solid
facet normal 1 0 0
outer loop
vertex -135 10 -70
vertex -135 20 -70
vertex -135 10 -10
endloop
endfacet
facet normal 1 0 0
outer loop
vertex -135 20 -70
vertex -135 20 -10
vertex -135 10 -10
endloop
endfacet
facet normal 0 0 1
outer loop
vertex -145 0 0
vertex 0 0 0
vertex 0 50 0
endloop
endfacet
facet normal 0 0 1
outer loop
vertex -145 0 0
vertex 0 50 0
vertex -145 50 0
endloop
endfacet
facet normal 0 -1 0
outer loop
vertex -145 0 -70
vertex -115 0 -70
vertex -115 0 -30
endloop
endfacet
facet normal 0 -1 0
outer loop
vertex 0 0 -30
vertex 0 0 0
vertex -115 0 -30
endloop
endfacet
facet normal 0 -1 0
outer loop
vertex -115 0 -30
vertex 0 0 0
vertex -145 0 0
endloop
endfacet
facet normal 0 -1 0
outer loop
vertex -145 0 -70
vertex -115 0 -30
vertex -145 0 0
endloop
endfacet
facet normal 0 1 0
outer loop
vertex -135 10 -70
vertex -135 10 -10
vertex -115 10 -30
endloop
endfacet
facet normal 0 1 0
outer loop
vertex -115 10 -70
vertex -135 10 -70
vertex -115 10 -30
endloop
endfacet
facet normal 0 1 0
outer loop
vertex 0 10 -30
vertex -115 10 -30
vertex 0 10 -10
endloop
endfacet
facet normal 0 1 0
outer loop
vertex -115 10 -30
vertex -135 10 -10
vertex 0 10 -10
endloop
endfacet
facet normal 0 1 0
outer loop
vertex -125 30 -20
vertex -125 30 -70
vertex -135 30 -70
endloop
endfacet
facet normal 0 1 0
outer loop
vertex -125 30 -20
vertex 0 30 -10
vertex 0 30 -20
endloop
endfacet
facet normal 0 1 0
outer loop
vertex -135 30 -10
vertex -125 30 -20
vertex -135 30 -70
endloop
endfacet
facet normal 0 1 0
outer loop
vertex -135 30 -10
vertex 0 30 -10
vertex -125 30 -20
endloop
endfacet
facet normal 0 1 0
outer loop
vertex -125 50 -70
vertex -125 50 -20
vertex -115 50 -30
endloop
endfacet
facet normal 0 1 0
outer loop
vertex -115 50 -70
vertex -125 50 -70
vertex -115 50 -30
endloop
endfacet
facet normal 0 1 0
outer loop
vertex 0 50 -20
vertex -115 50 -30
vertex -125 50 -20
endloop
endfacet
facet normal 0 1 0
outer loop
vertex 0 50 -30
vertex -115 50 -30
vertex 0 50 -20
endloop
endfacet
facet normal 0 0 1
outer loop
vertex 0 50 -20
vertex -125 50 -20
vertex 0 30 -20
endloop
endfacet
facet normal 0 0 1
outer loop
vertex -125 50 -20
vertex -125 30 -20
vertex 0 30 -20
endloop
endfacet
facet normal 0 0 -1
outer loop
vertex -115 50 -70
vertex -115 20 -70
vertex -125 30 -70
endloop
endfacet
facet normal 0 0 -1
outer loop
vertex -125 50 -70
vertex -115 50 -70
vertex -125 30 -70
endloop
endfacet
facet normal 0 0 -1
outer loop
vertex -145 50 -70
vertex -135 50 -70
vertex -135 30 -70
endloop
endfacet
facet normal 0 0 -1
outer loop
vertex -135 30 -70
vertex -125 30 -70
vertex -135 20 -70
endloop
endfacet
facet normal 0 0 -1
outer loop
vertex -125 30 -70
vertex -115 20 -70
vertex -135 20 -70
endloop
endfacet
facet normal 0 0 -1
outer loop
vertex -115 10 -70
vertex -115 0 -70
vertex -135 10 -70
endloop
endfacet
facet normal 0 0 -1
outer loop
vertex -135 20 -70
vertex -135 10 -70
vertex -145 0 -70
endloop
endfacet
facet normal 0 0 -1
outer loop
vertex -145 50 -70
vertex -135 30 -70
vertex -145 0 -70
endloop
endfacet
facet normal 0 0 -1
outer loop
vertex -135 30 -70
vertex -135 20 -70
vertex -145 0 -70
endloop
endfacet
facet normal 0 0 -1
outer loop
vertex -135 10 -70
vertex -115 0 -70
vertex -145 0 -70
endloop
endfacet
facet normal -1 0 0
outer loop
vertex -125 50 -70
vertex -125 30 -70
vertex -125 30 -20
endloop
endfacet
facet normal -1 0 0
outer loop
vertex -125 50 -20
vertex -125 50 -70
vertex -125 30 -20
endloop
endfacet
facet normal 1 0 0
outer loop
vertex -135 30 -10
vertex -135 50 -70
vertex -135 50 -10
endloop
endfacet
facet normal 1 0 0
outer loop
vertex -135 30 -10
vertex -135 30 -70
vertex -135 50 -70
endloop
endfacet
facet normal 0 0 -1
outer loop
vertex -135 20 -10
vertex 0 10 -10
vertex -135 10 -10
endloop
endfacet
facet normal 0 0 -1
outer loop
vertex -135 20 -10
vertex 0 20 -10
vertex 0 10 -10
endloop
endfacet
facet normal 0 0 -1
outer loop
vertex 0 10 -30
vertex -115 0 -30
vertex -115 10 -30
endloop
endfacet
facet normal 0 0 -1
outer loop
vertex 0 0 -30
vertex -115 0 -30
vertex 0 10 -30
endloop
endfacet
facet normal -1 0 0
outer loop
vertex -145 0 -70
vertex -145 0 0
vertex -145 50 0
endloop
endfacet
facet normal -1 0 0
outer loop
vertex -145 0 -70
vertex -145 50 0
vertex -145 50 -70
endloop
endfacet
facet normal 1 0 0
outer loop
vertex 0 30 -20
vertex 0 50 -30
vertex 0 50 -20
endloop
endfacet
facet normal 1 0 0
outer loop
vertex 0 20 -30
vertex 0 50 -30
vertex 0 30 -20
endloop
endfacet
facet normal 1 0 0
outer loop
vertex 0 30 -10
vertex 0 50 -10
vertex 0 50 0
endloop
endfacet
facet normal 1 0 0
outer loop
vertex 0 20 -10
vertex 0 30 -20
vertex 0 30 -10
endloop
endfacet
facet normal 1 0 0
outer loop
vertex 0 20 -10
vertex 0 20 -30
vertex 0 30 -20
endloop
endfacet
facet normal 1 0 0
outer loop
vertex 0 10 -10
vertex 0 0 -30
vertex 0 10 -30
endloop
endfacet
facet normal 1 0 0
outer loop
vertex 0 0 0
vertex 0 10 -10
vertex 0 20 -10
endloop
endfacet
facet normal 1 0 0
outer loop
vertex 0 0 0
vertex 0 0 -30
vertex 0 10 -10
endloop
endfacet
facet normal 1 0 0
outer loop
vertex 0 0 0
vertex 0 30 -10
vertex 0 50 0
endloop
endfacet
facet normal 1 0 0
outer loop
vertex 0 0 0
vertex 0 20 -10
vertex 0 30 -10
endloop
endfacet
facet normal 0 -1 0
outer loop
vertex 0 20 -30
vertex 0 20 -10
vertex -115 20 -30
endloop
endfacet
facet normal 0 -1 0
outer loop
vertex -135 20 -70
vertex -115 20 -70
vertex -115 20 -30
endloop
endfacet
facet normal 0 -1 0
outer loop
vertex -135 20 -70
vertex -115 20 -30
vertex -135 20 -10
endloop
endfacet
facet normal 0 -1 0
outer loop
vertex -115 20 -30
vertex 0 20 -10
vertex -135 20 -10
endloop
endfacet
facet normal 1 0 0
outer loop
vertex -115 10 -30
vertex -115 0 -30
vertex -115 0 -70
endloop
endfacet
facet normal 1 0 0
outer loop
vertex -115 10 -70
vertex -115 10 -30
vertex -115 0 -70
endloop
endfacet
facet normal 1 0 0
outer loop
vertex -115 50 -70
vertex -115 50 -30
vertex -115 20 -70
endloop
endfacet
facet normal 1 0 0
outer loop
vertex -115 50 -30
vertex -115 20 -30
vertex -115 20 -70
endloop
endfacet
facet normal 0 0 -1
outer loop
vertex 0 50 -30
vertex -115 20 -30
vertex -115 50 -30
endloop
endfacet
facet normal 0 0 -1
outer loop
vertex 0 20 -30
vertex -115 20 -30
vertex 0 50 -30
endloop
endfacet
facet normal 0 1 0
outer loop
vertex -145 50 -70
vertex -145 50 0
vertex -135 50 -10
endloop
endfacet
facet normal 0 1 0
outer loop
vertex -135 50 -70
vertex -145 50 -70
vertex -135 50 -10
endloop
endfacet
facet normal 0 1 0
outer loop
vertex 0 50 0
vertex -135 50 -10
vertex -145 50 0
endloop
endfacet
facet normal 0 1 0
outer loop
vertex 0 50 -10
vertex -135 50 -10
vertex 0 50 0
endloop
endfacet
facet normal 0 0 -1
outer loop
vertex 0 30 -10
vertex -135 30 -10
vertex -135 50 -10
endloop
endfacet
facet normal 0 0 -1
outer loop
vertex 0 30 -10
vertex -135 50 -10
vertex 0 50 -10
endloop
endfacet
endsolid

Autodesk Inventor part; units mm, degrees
ref_plane "YZ Plane" through (0, 0, 0) normal (1, 0, 0) x (0, 1, 0)
ref_plane "XZ Plane" through (0, 0, 0) normal (0, 1, 0) x (-1, 0, 0)
ref_plane "XY Plane" through (0, 0, 0) normal (0, 0, 1) x (1, 0, 0)
sketch "Sketch1" plane through (0, 0, 0) normal (0, 1, 0) x (-1, 0, 0)
  line L0 (0, 0) -> (145, 0)
  line L1 (145, 0) -> (145, -30)
  line L2 (145, -30) -> (0, -30)
  line L3 (0, -30) -> (0, 0)
  line L4 (145, 0) -> (115, 0)
  line L5 (115, 0) -> (115, -70)
  line L6 (115, -70) -> (145, -70)
  line L7 (145, -70) -> (145, 0)
  point P0 (115, -30)
  dimension "d0" = 145
  dimension "d1" = 30
  dimension "d2" = 30
  dimension "d3" = 70
extrude "Extrusion1" add sketch "Sketch1" along normal blind 30
sketch "Sketch2" plane through (0, 0, -30) normal (0, 0, -1) x (-1, 0, 0)
  line L0 (0, 20) -> (135, 20)
  line L1 (135, 20) -> (135, 10)
  line L2 (135, 10) -> (0, 10)
  line L3 (0, 10) -> (0, 20)
  dimension "d32" = 135
  dimension "d33" = 10
extrude "Extrusion2" cut sketch "Sketch2" along normal blind 50 and the other way blind 20
sketch "Sketch4" plane through (0, 30, 0) normal (0, 1, 0) x (1, 0, 0)
  line L0 (0, 0) -> (-145, 0)
  line L1 (-145, 0) -> (-145, 10)
  line L2 (-145, 10) -> (0, 10)
  line L3 (0, 10) -> (0, 0)
  line L4 (-115, 70) -> (-145, 70) projected
  line L5 (-145, 70) -> (-135, 70)
  line L6 (-135, 70) -> (-135, 10)
  line L7 (-135, 10) -> (-145, 10)
  line L8 (-145, 10) -> (-145, 70)
  line L9 (-115, 30) -> (-115, 70) projected
  line L10 (-115, 70) -> (-125, 70)
  line L11 (-125, 70) -> (-125, 30)
  line L12 (-125, 30) -> (-115, 30)
  line L13 (-115, 30) -> (-115, 70)
  line L14 (0, 30) -> (-125, 30)
  line L15 (-125, 30) -> (-125, 20)
  line L16 (-125, 20) -> (0, 20)
  line L17 (0, 20) -> (0, 30)
  dimension "d22" = 145
  dimension "d23" = 10
  dimension "d24" = 10
  dimension "d25" = 60
  dimension "d26" = 10
  dimension "d27" = 40
  dimension "d28" = 125
  dimension "d29" = 10
extrude "Extrusion4" add sketch "Sketch4" along normal blind 20
properties part number "TSU_Corner1_Clamp"
